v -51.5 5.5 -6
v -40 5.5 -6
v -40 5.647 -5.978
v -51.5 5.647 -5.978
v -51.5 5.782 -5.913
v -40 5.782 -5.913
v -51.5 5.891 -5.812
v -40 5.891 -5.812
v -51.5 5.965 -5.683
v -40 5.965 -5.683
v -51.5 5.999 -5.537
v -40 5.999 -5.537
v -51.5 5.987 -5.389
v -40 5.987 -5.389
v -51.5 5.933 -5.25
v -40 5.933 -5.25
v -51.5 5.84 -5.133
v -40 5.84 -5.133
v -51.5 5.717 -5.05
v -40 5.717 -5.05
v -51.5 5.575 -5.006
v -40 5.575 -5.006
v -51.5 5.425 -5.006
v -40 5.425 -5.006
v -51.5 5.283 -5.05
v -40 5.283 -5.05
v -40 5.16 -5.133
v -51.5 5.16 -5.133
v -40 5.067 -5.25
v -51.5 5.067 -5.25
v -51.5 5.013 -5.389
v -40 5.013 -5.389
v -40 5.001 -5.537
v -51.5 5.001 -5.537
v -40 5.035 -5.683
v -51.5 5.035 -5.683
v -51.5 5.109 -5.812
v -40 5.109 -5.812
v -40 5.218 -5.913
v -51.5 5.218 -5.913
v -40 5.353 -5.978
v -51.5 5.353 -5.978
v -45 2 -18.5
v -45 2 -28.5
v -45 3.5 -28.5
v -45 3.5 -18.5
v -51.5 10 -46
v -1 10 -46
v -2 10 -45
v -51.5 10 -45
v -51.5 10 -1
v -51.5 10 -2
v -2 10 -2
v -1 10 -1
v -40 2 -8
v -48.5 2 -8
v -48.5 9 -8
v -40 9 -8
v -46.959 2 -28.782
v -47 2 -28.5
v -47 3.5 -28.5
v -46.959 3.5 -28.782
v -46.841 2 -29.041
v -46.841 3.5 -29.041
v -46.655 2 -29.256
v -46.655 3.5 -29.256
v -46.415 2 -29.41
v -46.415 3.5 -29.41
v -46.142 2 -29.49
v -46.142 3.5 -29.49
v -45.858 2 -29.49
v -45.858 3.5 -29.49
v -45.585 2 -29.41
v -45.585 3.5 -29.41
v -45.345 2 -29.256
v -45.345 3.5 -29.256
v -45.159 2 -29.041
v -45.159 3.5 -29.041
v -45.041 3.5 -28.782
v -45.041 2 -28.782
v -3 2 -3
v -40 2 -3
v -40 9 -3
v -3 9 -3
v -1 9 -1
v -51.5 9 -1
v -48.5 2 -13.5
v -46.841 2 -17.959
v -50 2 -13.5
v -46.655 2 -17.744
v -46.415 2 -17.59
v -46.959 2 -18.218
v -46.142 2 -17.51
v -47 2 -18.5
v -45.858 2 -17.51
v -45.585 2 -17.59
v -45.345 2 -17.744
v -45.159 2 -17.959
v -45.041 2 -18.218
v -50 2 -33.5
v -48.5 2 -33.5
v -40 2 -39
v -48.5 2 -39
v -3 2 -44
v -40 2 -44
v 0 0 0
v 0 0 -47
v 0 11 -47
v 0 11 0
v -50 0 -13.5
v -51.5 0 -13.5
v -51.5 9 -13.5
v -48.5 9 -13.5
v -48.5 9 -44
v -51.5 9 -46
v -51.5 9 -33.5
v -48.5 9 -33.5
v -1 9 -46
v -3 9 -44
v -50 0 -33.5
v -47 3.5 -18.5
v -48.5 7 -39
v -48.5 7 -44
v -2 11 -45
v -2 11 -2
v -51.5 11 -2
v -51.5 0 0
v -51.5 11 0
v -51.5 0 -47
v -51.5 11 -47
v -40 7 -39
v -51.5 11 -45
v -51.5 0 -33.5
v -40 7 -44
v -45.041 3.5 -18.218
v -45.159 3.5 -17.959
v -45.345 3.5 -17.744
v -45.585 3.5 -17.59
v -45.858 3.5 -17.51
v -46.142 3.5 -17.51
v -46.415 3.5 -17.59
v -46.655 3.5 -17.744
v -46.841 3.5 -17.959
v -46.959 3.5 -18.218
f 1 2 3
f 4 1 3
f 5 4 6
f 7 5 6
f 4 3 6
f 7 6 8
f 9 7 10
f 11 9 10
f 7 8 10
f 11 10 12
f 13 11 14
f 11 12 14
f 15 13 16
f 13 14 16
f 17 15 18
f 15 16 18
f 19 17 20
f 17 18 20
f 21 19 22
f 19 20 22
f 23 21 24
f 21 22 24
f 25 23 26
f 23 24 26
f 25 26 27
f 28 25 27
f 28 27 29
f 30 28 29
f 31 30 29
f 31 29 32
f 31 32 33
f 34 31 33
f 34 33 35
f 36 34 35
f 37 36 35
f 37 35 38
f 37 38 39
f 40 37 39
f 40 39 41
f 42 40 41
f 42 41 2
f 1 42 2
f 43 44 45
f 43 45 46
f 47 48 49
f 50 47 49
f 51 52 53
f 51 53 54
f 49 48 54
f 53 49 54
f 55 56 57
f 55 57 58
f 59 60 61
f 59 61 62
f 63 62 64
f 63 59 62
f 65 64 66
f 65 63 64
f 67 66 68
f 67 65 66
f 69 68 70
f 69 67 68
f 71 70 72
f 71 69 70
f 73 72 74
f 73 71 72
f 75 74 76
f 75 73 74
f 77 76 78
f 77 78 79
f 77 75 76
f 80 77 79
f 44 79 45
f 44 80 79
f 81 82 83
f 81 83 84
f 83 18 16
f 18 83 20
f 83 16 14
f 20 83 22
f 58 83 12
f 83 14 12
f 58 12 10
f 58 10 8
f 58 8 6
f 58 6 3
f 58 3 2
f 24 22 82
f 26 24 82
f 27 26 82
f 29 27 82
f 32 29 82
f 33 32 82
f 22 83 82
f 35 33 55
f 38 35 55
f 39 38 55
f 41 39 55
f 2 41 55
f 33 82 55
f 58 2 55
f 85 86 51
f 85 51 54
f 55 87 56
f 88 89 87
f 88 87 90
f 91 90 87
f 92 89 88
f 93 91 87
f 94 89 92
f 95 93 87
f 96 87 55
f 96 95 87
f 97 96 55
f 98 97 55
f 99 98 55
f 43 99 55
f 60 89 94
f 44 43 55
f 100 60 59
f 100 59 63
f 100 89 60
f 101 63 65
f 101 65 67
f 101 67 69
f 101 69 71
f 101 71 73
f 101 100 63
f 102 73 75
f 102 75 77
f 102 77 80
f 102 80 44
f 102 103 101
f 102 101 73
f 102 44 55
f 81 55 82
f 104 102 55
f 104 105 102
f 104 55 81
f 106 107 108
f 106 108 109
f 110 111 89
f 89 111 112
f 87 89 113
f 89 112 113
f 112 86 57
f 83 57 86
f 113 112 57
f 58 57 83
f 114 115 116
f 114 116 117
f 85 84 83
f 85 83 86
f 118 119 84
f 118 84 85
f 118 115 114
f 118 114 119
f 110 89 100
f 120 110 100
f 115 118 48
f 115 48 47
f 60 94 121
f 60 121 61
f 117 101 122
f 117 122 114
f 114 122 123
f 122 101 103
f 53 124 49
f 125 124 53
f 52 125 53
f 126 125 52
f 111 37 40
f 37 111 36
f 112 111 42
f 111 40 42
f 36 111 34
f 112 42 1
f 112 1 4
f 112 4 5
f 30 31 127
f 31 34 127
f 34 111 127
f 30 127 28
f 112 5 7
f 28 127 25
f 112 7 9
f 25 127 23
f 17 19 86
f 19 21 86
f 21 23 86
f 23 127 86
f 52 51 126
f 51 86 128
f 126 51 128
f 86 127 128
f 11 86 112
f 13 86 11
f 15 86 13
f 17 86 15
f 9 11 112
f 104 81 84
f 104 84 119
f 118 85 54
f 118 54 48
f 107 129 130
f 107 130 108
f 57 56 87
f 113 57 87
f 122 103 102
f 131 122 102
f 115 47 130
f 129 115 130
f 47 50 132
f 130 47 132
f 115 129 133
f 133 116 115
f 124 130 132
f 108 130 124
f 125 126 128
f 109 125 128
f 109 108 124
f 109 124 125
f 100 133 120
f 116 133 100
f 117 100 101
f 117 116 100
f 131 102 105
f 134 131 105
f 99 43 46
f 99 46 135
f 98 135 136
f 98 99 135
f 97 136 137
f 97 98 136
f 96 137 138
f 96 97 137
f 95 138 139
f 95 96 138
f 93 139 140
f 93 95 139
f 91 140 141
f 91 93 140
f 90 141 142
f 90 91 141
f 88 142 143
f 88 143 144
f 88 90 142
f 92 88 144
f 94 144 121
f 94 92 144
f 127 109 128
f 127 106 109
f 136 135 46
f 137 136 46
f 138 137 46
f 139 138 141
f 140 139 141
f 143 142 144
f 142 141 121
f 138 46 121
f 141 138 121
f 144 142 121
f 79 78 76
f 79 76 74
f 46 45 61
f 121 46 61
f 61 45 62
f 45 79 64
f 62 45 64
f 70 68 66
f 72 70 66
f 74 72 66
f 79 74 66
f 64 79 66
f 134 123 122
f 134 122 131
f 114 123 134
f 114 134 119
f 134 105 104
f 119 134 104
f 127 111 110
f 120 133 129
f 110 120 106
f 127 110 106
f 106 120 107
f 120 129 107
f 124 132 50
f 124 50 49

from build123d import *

# Parameters (mm, degrees)
CROQUIS1_W               = 51.5
CROQUIS1_H               = 47
SALIENTE_EXTRUIR1_DEPTH  = 2
SALIENTE_EXTRUIR11_DEPTH = 1.5
CROQUIS3_W               = 51.5
CROQUIS3_H               = 47
CROQUIS3_W_2             = 45.5
CROQUIS3_H_2             = 41
SALIENTE_EXTRUIR10_DEPTH = 7
CROQUIS4_W               = 3
CROQUIS4_H               = 20
CORTAR_EXTRUIR3_DEPTH    = 7
CROQUIS5_W               = 8.5
CROQUIS5_H               = 5
SALIENTE_EXTRUIR12_DEPTH = 7
CROQUIS6_R               = 0.5
CORTAR_EXTRUIR2_DEPTH    = 12.5
CROQUIS8_W               = 8.5
CROQUIS8_H               = 5
SALIENTE_EXTRUIR13_DEPTH = 5
SALIENTE_EXTRUIR14_DEPTH = 2
CROQUIS10_W              = 50.5
CROQUIS10_H              = 1
SALIENTE_EXTRUIR15_DEPTH = 1
CROQUIS11_W              = 50.5
CROQUIS11_H              = 1
SALIENTE_EXTRUIR16_DEPTH = 1
CROQUIS12_W              = 43
CROQUIS12_H              = 1
SALIENTE_EXTRUIR17_DEPTH = 1
CROQUIS13_W              = 1.5
CROQUIS13_H              = 20
CORTAR_EXTRUIR4_DEPTH    = 3


with BuildPart() as part:
    # Croquis1 → Saliente-Extruir1 (new body)
    with BuildSketch(Plane(origin=(0, 0, 0), x_dir=(1, 0, 0), z_dir=(0, 1, 0))):
        with Locations((-25.75, 23.5)):
            Rectangle(CROQUIS1_W, CROQUIS1_H)
    extrude(amount=SALIENTE_EXTRUIR1_DEPTH)

    # Croquis2 → Saliente-Extruir11 (add)
    with BuildSketch(Plane(origin=(0, 2, 0), x_dir=(1, 0, 0), z_dir=(0, 1, 0))):
        with BuildLine():
            Line((-45, 28.5), (-45, 18.5))
            ThreePointArc((-45, 18.5), (-46, 17.5), (-47, 18.5))
            Line((-47, 18.5), (-47, 28.5))
            ThreePointArc((-47, 28.5), (-46, 29.5), (-45, 28.5))
        make_face()
    extrude(amount=SALIENTE_EXTRUIR11_DEPTH)

    # Croquis3 → Saliente-Extruir10 (add)
    with BuildSketch(Plane(origin=(0, 2, 0), x_dir=(1, 0, 0), z_dir=(0, 1, 0))):
        with Locations((-25.75, 23.5)):
            Rectangle(CROQUIS3_W, CROQUIS3_H)
        with Locations((-25.75, 23.5)):
            Rectangle(CROQUIS3_W_2, CROQUIS3_H_2, mode=Mode.SUBTRACT)
    extrude(amount=SALIENTE_EXTRUIR10_DEPTH)

    # Croquis4 → Cortar-Extruir3 (cut)
    with BuildSketch(Plane(origin=(0, 9, 0), x_dir=(1, 0, 0), z_dir=(0, 1, 0))):
        with Locations((-50, 23.5)):
            Rectangle(CROQUIS4_W, CROQUIS4_H)
    extrude(amount=-CORTAR_EXTRUIR3_DEPTH, mode=Mode.SUBTRACT)

    # Croquis5 → Saliente-Extruir12 (add)
    with BuildSketch(Plane(origin=(0, 2, 0), x_dir=(1, 0, 0), z_dir=(0, 1, 0))):
        with Locations((-44.25, 5.5)):
            Rectangle(CROQUIS5_W, CROQUIS5_H)
    extrude(amount=SALIENTE_EXTRUIR12_DEPTH)

    # Croquis6 → Cortar-Extruir2 (cut, through all)
    with BuildSketch(Plane(origin=(-40, 0, 0), x_dir=(0, 0, -1), z_dir=(1, 0, 0))):
        with Locations((5.5, 5.5)):
            Circle(CROQUIS6_R)
    extrude(amount=-CORTAR_EXTRUIR2_DEPTH, mode=Mode.SUBTRACT)

    # Croquis8 → Saliente-Extruir13 (add)
    with BuildSketch(Plane(origin=(0, 2, 0), x_dir=(1, 0, 0), z_dir=(0, 1, 0))):
        with Locations((-44.25, 41.5)):
            Rectangle(CROQUIS8_W, CROQUIS8_H)
    extrude(amount=SALIENTE_EXTRUIR13_DEPTH)

    # Croquis9 → Saliente-Extruir14 (add)
    with BuildSketch(Plane(origin=(0, 9, 0), x_dir=(1, 0, 0), z_dir=(0, 1, 0))):
        Polygon((-51.5, 1), (-1, 1), (-1, 46), (-51.5, 46), (-51.5, 47), (0, 47), (0, 0), (-51.5, 0), align=None)
    extrude(amount=SALIENTE_EXTRUIR14_DEPTH)

    # Croquis10 → Saliente-Extruir15 (add)
    with BuildSketch(Plane.XY.offset(-46)):
        with Locations((-26.25, 10.5)):
            Rectangle(CROQUIS10_W, CROQUIS10_H)
    extrude(amount=SALIENTE_EXTRUIR15_DEPTH)

    # Croquis11 → Saliente-Extruir16 (add)
    with BuildSketch(Plane(origin=(0, 0, -1), x_dir=(-1, 0, 0), z_dir=(0, 0, -1))):
        with Locations((26.25, 10.5)):
            Rectangle(CROQUIS11_W, CROQUIS11_H)
    extrude(amount=SALIENTE_EXTRUIR16_DEPTH)

    # Croquis12 → Saliente-Extruir17 (add)
    with BuildSketch(Plane.ZY.offset(1)):
        with Locations((-23.5, 10.5)):
            Rectangle(CROQUIS12_W, CROQUIS12_H)
    extrude(amount=SALIENTE_EXTRUIR17_DEPTH)

    # Croquis13 → Cortar-Extruir4 (cut, through all)
    with BuildSketch(Plane(origin=(0, 2, 0), x_dir=(1, 0, 0), z_dir=(0, 1, 0))):
        with Locations((-50.75, 23.5)):
            Rectangle(CROQUIS13_W, CROQUIS13_H)
    extrude(amount=-CORTAR_EXTRUIR4_DEPTH, mode=Mode.SUBTRACT)


solid = part.part
